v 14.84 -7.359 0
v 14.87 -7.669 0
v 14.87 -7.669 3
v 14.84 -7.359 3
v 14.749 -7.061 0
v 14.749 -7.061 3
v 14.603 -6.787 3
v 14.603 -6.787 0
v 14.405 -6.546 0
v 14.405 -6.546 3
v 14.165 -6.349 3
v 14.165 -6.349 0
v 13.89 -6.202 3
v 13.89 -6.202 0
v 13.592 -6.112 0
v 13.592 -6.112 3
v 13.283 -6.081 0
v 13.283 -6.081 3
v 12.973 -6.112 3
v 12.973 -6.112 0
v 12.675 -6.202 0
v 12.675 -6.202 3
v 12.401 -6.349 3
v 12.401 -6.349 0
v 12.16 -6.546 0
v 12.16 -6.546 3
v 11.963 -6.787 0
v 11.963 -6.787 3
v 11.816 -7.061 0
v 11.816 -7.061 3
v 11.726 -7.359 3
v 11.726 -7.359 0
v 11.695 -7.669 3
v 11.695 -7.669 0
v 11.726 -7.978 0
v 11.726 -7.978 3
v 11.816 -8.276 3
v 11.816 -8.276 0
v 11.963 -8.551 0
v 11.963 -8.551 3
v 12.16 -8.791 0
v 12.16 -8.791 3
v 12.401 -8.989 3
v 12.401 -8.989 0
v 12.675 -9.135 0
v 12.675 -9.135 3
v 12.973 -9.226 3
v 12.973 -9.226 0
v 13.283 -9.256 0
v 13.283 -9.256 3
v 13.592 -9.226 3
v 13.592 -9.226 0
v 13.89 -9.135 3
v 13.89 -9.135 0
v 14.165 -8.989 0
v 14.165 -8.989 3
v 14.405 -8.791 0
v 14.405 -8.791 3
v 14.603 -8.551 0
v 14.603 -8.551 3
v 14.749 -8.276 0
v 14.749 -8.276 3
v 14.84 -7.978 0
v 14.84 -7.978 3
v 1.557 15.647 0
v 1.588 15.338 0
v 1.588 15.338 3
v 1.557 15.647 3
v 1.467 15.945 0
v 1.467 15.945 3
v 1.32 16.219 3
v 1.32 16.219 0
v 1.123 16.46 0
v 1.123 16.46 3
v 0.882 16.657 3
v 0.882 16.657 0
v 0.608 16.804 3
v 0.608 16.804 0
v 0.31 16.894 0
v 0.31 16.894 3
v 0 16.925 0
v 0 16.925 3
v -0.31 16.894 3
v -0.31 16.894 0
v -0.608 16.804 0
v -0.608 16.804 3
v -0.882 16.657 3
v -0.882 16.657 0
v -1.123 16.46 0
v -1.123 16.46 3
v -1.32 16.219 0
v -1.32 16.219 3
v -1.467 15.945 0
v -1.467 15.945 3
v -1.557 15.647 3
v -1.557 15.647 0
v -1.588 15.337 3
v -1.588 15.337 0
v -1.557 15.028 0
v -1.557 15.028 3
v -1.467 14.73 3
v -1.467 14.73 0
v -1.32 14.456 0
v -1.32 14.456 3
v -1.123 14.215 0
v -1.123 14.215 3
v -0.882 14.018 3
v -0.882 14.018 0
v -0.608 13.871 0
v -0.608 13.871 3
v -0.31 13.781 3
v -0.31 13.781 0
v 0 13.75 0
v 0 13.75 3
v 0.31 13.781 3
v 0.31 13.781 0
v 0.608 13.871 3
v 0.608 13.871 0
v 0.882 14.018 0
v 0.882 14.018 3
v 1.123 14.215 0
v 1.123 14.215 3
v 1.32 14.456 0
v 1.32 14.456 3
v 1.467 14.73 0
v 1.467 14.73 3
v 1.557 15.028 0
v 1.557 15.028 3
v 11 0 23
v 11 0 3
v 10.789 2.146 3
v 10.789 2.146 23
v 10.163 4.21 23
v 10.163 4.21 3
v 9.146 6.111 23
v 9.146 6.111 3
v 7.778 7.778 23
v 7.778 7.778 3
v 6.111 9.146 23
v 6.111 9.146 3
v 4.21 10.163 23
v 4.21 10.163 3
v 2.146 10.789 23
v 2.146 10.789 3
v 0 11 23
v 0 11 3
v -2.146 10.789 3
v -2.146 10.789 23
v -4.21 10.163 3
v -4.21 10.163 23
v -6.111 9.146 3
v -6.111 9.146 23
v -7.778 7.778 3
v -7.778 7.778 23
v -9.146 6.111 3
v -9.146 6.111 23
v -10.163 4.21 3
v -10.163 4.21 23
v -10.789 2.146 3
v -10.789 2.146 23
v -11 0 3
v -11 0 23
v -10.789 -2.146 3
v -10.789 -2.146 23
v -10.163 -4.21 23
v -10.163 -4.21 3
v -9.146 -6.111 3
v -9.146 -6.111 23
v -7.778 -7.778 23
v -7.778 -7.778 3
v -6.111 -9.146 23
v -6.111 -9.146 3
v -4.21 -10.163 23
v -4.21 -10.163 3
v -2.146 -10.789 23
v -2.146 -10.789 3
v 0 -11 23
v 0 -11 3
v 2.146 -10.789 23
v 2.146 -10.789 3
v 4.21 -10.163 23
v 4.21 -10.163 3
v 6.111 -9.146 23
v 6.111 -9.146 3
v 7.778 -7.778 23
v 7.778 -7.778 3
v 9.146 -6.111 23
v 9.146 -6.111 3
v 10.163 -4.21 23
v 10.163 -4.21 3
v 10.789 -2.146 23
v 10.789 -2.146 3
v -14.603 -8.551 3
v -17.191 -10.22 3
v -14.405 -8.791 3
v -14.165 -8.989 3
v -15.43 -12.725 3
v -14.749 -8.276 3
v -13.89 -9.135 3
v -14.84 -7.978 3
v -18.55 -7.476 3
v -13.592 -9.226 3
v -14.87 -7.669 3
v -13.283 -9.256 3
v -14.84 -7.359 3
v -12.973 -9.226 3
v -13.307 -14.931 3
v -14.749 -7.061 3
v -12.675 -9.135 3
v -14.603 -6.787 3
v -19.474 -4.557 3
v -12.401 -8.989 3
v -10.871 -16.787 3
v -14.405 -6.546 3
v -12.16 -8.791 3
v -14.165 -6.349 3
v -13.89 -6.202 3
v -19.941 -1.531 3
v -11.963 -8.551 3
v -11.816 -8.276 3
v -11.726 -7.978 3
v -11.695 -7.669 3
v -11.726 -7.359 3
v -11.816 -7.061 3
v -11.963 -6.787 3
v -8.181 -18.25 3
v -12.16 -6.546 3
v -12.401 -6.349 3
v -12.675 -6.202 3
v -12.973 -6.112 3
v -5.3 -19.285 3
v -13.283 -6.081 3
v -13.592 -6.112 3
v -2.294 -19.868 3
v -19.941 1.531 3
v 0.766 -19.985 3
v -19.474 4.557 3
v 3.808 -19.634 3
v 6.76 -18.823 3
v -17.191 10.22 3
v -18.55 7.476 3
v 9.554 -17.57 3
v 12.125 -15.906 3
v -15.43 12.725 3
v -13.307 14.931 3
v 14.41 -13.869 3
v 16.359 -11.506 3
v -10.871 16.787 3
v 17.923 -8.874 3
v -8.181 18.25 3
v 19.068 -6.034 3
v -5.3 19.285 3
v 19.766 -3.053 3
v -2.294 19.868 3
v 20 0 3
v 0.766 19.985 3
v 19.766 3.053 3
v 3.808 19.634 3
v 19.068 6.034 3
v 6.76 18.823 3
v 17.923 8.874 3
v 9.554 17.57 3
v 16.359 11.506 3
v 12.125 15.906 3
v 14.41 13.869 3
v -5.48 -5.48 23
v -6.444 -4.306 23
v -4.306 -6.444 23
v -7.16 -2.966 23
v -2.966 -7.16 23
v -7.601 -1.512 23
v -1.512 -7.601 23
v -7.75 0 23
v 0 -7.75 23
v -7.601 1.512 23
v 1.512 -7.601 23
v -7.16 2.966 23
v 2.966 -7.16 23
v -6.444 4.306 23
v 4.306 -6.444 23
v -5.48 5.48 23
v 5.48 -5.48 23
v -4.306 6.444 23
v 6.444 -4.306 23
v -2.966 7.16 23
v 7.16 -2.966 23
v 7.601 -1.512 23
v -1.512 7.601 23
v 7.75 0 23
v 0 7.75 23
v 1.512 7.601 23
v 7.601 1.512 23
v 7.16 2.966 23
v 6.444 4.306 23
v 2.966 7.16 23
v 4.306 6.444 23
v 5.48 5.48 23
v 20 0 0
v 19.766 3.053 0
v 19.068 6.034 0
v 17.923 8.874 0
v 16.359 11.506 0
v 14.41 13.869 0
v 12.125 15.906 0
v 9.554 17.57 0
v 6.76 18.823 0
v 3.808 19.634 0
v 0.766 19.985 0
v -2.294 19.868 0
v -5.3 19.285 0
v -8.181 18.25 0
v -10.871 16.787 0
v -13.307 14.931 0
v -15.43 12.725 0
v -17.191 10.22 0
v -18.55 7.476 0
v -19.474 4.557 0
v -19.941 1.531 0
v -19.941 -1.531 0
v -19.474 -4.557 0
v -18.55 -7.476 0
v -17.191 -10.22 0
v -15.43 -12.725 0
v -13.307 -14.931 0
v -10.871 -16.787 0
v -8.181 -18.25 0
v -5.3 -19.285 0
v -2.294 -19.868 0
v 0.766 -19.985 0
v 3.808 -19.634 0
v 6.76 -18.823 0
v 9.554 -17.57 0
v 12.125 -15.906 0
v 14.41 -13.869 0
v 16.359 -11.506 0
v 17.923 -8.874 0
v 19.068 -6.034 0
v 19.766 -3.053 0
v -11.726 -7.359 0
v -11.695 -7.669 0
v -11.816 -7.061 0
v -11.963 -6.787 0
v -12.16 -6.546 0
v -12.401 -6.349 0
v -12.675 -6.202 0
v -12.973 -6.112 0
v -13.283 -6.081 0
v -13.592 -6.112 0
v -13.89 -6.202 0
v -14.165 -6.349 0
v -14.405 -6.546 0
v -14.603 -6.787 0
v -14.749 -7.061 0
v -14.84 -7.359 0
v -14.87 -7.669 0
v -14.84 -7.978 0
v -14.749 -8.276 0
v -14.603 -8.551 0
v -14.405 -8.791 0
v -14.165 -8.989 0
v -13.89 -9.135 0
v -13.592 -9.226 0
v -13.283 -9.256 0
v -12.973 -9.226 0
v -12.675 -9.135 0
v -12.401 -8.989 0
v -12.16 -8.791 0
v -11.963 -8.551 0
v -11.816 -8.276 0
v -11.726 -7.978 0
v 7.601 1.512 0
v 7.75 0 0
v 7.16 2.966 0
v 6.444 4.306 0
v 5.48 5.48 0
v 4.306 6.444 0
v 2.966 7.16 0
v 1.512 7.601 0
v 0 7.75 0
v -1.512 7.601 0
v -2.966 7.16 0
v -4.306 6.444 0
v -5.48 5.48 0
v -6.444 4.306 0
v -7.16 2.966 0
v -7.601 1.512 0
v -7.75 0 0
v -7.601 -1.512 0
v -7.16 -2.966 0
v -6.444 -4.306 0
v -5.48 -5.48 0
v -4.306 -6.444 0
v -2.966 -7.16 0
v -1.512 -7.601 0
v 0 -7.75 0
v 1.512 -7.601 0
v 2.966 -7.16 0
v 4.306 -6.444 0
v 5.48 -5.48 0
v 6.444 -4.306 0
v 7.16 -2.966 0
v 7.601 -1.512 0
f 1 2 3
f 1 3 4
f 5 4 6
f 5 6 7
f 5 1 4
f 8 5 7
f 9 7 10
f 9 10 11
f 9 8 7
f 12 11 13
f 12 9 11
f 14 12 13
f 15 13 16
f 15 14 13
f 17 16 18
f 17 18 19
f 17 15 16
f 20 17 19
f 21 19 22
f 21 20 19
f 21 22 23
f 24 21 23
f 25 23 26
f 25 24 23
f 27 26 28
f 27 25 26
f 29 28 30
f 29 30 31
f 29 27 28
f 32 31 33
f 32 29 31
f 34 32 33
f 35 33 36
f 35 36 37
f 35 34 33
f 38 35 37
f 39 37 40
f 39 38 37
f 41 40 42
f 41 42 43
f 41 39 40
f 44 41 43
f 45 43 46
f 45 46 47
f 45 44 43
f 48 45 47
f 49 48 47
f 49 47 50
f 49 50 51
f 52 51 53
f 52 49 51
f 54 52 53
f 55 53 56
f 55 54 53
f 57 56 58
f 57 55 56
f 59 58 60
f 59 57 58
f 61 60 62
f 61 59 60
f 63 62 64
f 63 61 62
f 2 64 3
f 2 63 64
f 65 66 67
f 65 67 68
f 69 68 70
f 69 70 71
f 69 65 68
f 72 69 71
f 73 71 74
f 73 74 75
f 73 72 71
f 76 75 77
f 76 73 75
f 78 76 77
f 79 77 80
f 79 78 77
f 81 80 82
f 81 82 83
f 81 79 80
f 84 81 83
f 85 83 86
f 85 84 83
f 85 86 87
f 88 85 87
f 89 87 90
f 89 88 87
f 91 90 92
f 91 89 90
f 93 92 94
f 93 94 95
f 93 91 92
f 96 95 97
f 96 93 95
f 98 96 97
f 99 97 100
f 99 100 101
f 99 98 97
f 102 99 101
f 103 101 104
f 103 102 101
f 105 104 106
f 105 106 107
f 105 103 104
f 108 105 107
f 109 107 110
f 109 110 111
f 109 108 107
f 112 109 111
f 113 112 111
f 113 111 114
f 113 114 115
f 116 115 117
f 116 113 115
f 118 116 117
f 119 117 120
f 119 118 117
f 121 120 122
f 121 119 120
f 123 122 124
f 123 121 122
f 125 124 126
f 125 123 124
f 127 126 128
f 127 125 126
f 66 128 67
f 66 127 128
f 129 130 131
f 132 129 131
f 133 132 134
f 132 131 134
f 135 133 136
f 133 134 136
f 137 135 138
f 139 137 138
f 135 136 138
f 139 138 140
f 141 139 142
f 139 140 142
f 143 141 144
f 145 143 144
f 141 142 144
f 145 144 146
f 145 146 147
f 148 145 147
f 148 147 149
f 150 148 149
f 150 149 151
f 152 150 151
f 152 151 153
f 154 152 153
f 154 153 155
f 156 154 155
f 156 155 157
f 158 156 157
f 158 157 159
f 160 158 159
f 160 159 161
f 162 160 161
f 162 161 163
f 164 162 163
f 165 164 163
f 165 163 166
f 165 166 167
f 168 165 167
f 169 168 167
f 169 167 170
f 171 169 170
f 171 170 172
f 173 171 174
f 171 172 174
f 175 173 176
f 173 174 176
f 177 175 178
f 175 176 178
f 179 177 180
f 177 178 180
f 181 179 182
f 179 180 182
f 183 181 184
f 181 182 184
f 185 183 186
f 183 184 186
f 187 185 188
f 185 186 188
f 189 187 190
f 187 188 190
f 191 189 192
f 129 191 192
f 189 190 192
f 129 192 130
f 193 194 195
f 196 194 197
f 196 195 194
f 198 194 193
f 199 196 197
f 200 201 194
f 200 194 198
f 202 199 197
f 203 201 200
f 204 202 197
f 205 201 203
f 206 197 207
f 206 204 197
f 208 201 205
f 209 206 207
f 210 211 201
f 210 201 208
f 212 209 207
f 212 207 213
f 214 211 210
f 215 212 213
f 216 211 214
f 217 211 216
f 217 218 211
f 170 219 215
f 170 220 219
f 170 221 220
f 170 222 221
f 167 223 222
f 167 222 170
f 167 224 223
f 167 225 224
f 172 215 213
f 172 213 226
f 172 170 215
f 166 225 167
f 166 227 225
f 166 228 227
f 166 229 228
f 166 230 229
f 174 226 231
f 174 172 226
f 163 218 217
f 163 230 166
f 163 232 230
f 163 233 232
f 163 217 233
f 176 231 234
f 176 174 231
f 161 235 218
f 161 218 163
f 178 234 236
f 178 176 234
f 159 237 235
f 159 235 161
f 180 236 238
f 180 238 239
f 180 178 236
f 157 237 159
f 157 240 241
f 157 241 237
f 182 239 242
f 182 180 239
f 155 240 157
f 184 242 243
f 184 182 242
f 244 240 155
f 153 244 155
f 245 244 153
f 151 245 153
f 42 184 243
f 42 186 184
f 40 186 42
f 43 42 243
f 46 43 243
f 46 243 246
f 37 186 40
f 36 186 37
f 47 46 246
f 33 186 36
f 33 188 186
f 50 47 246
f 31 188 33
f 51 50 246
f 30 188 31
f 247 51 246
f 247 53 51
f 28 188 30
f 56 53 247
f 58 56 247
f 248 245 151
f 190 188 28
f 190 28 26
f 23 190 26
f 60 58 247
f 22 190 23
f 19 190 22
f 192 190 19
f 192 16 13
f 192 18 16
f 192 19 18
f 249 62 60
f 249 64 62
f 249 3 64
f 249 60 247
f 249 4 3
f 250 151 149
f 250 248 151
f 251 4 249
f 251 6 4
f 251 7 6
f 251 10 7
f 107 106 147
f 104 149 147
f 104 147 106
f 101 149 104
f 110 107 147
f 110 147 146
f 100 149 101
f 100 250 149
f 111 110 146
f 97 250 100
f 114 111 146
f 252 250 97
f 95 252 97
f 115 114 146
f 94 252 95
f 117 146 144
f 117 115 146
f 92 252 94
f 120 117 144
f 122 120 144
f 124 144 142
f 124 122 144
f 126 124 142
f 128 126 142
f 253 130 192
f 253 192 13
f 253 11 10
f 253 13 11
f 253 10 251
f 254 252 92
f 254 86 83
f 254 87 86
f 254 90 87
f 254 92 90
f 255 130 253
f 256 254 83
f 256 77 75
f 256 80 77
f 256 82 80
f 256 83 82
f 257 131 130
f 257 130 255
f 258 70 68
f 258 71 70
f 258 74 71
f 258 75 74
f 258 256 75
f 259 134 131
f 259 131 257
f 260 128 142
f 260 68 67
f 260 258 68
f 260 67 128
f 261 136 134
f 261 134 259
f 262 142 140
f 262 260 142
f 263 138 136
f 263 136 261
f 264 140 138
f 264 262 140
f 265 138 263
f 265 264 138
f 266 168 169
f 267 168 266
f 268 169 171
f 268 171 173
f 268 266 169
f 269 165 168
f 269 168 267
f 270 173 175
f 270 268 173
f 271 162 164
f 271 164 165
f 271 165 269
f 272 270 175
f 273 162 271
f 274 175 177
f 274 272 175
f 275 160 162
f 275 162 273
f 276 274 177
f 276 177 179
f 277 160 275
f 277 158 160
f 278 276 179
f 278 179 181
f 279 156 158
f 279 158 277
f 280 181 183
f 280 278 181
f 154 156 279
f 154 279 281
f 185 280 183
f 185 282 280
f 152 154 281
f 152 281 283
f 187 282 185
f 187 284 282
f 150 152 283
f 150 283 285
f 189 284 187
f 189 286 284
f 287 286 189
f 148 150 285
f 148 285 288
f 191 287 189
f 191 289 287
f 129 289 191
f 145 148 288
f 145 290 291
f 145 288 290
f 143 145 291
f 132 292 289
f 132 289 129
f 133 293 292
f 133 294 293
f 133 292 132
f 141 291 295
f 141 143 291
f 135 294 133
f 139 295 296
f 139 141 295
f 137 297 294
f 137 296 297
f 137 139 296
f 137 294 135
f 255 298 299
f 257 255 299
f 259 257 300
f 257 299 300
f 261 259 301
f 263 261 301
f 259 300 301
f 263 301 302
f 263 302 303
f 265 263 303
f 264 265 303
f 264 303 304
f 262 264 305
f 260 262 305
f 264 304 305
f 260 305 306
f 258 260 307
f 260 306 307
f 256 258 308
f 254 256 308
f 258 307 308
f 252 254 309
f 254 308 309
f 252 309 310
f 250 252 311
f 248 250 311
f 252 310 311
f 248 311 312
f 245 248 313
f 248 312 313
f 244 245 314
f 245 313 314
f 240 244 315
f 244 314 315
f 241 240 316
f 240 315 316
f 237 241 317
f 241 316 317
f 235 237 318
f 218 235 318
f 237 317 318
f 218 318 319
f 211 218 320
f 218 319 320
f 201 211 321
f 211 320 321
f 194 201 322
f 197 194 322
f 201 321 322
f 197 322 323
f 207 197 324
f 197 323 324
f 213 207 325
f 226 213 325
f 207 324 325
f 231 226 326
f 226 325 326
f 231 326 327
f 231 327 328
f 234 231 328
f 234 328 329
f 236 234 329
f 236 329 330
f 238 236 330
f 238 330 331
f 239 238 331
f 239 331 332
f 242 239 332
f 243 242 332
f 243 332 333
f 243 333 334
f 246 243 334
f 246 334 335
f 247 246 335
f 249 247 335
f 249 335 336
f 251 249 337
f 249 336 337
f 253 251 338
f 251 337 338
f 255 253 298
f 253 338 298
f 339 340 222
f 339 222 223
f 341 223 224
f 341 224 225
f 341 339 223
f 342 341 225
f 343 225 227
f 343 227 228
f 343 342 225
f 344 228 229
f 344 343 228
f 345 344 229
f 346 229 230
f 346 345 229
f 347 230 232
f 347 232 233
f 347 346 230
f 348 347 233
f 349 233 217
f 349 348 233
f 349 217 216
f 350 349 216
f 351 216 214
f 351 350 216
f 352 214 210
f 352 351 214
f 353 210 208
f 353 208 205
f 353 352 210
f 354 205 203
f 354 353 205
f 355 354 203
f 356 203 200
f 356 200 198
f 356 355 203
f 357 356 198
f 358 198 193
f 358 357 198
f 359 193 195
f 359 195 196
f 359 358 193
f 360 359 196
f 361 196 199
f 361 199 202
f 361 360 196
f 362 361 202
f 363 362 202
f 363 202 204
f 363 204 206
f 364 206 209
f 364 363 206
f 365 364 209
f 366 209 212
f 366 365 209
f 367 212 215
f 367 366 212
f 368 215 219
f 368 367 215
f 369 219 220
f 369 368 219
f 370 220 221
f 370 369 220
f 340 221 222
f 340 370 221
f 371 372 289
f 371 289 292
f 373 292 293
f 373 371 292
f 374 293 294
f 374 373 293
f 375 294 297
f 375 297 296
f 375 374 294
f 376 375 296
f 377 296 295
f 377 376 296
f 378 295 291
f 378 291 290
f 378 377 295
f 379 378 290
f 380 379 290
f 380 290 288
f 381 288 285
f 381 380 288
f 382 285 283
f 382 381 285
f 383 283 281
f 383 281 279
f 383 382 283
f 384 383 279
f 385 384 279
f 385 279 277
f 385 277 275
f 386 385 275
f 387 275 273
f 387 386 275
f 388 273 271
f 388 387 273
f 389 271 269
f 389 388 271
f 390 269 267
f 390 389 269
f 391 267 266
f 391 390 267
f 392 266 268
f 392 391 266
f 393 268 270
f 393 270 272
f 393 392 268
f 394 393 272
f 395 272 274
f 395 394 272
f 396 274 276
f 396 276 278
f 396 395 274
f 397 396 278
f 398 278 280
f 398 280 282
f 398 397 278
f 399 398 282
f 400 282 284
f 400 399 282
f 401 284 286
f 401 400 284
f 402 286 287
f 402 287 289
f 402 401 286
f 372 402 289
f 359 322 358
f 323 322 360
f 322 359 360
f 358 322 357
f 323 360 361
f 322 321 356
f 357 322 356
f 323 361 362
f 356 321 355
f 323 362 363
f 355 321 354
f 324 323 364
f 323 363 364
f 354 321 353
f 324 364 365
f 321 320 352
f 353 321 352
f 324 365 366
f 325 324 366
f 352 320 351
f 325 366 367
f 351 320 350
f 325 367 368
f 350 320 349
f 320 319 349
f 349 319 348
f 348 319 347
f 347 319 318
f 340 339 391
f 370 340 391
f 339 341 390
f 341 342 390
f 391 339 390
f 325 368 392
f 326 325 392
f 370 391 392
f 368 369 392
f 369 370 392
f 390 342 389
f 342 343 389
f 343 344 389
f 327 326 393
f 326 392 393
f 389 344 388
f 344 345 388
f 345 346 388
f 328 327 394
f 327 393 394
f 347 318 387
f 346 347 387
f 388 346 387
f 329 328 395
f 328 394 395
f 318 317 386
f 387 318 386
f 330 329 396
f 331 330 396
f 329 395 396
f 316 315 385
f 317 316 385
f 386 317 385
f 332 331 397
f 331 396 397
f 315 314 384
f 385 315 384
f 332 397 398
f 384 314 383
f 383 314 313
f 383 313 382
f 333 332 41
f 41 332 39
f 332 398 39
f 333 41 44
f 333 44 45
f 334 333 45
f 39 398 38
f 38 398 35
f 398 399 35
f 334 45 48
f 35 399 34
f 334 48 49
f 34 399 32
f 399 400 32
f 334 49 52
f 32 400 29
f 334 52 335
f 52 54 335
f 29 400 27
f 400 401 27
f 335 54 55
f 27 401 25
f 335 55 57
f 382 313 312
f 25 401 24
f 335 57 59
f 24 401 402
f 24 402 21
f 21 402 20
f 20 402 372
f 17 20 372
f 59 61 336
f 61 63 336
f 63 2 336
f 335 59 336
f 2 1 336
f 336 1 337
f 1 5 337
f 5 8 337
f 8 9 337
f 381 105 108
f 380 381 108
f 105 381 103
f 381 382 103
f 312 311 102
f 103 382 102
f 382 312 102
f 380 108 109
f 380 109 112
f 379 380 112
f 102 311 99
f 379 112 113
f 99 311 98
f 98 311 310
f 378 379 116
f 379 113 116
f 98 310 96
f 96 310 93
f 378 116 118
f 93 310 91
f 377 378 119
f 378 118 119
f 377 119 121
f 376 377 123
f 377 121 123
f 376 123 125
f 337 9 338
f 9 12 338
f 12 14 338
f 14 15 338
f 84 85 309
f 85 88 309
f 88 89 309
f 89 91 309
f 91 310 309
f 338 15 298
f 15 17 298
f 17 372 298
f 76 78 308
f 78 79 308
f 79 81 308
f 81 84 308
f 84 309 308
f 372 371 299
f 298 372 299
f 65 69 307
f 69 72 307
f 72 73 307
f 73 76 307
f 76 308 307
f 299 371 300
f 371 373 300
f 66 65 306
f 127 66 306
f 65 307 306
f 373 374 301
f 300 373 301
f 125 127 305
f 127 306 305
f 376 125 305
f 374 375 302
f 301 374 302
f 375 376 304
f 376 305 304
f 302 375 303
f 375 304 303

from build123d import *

# Parameters (mm, degrees)
F0_R     = 11
F0_R_2   = 7.75
F1_DEPTH = 23
F0_R_3   = 20
F0_R_4   = 1.5875
F2_DEPTH = 3


with BuildPart() as f1:
    # F0 (on Top) → F1 (new body)
    with BuildSketch(Plane.XY):
        Circle(F0_R)
        Circle(F0_R_2, mode=Mode.SUBTRACT)
    extrude(amount=F1_DEPTH)

    # F0 (on Top) → F2 (join)
    with BuildSketch(Plane.XY):
        Circle(F0_R_3)
        with Locations((-13.282665, -7.66875)):
            Circle(F0_R_4, mode=Mode.SUBTRACT)
        with Locations((13.282665, -7.66875)):
            Circle(F0_R_4, mode=Mode.SUBTRACT)
        Circle(F0_R, mode=Mode.SUBTRACT)
        with Locations((0, 15.3375)):
            Circle(F0_R_4, mode=Mode.SUBTRACT)
    extrude(amount=F2_DEPTH)


solid = f1.part
